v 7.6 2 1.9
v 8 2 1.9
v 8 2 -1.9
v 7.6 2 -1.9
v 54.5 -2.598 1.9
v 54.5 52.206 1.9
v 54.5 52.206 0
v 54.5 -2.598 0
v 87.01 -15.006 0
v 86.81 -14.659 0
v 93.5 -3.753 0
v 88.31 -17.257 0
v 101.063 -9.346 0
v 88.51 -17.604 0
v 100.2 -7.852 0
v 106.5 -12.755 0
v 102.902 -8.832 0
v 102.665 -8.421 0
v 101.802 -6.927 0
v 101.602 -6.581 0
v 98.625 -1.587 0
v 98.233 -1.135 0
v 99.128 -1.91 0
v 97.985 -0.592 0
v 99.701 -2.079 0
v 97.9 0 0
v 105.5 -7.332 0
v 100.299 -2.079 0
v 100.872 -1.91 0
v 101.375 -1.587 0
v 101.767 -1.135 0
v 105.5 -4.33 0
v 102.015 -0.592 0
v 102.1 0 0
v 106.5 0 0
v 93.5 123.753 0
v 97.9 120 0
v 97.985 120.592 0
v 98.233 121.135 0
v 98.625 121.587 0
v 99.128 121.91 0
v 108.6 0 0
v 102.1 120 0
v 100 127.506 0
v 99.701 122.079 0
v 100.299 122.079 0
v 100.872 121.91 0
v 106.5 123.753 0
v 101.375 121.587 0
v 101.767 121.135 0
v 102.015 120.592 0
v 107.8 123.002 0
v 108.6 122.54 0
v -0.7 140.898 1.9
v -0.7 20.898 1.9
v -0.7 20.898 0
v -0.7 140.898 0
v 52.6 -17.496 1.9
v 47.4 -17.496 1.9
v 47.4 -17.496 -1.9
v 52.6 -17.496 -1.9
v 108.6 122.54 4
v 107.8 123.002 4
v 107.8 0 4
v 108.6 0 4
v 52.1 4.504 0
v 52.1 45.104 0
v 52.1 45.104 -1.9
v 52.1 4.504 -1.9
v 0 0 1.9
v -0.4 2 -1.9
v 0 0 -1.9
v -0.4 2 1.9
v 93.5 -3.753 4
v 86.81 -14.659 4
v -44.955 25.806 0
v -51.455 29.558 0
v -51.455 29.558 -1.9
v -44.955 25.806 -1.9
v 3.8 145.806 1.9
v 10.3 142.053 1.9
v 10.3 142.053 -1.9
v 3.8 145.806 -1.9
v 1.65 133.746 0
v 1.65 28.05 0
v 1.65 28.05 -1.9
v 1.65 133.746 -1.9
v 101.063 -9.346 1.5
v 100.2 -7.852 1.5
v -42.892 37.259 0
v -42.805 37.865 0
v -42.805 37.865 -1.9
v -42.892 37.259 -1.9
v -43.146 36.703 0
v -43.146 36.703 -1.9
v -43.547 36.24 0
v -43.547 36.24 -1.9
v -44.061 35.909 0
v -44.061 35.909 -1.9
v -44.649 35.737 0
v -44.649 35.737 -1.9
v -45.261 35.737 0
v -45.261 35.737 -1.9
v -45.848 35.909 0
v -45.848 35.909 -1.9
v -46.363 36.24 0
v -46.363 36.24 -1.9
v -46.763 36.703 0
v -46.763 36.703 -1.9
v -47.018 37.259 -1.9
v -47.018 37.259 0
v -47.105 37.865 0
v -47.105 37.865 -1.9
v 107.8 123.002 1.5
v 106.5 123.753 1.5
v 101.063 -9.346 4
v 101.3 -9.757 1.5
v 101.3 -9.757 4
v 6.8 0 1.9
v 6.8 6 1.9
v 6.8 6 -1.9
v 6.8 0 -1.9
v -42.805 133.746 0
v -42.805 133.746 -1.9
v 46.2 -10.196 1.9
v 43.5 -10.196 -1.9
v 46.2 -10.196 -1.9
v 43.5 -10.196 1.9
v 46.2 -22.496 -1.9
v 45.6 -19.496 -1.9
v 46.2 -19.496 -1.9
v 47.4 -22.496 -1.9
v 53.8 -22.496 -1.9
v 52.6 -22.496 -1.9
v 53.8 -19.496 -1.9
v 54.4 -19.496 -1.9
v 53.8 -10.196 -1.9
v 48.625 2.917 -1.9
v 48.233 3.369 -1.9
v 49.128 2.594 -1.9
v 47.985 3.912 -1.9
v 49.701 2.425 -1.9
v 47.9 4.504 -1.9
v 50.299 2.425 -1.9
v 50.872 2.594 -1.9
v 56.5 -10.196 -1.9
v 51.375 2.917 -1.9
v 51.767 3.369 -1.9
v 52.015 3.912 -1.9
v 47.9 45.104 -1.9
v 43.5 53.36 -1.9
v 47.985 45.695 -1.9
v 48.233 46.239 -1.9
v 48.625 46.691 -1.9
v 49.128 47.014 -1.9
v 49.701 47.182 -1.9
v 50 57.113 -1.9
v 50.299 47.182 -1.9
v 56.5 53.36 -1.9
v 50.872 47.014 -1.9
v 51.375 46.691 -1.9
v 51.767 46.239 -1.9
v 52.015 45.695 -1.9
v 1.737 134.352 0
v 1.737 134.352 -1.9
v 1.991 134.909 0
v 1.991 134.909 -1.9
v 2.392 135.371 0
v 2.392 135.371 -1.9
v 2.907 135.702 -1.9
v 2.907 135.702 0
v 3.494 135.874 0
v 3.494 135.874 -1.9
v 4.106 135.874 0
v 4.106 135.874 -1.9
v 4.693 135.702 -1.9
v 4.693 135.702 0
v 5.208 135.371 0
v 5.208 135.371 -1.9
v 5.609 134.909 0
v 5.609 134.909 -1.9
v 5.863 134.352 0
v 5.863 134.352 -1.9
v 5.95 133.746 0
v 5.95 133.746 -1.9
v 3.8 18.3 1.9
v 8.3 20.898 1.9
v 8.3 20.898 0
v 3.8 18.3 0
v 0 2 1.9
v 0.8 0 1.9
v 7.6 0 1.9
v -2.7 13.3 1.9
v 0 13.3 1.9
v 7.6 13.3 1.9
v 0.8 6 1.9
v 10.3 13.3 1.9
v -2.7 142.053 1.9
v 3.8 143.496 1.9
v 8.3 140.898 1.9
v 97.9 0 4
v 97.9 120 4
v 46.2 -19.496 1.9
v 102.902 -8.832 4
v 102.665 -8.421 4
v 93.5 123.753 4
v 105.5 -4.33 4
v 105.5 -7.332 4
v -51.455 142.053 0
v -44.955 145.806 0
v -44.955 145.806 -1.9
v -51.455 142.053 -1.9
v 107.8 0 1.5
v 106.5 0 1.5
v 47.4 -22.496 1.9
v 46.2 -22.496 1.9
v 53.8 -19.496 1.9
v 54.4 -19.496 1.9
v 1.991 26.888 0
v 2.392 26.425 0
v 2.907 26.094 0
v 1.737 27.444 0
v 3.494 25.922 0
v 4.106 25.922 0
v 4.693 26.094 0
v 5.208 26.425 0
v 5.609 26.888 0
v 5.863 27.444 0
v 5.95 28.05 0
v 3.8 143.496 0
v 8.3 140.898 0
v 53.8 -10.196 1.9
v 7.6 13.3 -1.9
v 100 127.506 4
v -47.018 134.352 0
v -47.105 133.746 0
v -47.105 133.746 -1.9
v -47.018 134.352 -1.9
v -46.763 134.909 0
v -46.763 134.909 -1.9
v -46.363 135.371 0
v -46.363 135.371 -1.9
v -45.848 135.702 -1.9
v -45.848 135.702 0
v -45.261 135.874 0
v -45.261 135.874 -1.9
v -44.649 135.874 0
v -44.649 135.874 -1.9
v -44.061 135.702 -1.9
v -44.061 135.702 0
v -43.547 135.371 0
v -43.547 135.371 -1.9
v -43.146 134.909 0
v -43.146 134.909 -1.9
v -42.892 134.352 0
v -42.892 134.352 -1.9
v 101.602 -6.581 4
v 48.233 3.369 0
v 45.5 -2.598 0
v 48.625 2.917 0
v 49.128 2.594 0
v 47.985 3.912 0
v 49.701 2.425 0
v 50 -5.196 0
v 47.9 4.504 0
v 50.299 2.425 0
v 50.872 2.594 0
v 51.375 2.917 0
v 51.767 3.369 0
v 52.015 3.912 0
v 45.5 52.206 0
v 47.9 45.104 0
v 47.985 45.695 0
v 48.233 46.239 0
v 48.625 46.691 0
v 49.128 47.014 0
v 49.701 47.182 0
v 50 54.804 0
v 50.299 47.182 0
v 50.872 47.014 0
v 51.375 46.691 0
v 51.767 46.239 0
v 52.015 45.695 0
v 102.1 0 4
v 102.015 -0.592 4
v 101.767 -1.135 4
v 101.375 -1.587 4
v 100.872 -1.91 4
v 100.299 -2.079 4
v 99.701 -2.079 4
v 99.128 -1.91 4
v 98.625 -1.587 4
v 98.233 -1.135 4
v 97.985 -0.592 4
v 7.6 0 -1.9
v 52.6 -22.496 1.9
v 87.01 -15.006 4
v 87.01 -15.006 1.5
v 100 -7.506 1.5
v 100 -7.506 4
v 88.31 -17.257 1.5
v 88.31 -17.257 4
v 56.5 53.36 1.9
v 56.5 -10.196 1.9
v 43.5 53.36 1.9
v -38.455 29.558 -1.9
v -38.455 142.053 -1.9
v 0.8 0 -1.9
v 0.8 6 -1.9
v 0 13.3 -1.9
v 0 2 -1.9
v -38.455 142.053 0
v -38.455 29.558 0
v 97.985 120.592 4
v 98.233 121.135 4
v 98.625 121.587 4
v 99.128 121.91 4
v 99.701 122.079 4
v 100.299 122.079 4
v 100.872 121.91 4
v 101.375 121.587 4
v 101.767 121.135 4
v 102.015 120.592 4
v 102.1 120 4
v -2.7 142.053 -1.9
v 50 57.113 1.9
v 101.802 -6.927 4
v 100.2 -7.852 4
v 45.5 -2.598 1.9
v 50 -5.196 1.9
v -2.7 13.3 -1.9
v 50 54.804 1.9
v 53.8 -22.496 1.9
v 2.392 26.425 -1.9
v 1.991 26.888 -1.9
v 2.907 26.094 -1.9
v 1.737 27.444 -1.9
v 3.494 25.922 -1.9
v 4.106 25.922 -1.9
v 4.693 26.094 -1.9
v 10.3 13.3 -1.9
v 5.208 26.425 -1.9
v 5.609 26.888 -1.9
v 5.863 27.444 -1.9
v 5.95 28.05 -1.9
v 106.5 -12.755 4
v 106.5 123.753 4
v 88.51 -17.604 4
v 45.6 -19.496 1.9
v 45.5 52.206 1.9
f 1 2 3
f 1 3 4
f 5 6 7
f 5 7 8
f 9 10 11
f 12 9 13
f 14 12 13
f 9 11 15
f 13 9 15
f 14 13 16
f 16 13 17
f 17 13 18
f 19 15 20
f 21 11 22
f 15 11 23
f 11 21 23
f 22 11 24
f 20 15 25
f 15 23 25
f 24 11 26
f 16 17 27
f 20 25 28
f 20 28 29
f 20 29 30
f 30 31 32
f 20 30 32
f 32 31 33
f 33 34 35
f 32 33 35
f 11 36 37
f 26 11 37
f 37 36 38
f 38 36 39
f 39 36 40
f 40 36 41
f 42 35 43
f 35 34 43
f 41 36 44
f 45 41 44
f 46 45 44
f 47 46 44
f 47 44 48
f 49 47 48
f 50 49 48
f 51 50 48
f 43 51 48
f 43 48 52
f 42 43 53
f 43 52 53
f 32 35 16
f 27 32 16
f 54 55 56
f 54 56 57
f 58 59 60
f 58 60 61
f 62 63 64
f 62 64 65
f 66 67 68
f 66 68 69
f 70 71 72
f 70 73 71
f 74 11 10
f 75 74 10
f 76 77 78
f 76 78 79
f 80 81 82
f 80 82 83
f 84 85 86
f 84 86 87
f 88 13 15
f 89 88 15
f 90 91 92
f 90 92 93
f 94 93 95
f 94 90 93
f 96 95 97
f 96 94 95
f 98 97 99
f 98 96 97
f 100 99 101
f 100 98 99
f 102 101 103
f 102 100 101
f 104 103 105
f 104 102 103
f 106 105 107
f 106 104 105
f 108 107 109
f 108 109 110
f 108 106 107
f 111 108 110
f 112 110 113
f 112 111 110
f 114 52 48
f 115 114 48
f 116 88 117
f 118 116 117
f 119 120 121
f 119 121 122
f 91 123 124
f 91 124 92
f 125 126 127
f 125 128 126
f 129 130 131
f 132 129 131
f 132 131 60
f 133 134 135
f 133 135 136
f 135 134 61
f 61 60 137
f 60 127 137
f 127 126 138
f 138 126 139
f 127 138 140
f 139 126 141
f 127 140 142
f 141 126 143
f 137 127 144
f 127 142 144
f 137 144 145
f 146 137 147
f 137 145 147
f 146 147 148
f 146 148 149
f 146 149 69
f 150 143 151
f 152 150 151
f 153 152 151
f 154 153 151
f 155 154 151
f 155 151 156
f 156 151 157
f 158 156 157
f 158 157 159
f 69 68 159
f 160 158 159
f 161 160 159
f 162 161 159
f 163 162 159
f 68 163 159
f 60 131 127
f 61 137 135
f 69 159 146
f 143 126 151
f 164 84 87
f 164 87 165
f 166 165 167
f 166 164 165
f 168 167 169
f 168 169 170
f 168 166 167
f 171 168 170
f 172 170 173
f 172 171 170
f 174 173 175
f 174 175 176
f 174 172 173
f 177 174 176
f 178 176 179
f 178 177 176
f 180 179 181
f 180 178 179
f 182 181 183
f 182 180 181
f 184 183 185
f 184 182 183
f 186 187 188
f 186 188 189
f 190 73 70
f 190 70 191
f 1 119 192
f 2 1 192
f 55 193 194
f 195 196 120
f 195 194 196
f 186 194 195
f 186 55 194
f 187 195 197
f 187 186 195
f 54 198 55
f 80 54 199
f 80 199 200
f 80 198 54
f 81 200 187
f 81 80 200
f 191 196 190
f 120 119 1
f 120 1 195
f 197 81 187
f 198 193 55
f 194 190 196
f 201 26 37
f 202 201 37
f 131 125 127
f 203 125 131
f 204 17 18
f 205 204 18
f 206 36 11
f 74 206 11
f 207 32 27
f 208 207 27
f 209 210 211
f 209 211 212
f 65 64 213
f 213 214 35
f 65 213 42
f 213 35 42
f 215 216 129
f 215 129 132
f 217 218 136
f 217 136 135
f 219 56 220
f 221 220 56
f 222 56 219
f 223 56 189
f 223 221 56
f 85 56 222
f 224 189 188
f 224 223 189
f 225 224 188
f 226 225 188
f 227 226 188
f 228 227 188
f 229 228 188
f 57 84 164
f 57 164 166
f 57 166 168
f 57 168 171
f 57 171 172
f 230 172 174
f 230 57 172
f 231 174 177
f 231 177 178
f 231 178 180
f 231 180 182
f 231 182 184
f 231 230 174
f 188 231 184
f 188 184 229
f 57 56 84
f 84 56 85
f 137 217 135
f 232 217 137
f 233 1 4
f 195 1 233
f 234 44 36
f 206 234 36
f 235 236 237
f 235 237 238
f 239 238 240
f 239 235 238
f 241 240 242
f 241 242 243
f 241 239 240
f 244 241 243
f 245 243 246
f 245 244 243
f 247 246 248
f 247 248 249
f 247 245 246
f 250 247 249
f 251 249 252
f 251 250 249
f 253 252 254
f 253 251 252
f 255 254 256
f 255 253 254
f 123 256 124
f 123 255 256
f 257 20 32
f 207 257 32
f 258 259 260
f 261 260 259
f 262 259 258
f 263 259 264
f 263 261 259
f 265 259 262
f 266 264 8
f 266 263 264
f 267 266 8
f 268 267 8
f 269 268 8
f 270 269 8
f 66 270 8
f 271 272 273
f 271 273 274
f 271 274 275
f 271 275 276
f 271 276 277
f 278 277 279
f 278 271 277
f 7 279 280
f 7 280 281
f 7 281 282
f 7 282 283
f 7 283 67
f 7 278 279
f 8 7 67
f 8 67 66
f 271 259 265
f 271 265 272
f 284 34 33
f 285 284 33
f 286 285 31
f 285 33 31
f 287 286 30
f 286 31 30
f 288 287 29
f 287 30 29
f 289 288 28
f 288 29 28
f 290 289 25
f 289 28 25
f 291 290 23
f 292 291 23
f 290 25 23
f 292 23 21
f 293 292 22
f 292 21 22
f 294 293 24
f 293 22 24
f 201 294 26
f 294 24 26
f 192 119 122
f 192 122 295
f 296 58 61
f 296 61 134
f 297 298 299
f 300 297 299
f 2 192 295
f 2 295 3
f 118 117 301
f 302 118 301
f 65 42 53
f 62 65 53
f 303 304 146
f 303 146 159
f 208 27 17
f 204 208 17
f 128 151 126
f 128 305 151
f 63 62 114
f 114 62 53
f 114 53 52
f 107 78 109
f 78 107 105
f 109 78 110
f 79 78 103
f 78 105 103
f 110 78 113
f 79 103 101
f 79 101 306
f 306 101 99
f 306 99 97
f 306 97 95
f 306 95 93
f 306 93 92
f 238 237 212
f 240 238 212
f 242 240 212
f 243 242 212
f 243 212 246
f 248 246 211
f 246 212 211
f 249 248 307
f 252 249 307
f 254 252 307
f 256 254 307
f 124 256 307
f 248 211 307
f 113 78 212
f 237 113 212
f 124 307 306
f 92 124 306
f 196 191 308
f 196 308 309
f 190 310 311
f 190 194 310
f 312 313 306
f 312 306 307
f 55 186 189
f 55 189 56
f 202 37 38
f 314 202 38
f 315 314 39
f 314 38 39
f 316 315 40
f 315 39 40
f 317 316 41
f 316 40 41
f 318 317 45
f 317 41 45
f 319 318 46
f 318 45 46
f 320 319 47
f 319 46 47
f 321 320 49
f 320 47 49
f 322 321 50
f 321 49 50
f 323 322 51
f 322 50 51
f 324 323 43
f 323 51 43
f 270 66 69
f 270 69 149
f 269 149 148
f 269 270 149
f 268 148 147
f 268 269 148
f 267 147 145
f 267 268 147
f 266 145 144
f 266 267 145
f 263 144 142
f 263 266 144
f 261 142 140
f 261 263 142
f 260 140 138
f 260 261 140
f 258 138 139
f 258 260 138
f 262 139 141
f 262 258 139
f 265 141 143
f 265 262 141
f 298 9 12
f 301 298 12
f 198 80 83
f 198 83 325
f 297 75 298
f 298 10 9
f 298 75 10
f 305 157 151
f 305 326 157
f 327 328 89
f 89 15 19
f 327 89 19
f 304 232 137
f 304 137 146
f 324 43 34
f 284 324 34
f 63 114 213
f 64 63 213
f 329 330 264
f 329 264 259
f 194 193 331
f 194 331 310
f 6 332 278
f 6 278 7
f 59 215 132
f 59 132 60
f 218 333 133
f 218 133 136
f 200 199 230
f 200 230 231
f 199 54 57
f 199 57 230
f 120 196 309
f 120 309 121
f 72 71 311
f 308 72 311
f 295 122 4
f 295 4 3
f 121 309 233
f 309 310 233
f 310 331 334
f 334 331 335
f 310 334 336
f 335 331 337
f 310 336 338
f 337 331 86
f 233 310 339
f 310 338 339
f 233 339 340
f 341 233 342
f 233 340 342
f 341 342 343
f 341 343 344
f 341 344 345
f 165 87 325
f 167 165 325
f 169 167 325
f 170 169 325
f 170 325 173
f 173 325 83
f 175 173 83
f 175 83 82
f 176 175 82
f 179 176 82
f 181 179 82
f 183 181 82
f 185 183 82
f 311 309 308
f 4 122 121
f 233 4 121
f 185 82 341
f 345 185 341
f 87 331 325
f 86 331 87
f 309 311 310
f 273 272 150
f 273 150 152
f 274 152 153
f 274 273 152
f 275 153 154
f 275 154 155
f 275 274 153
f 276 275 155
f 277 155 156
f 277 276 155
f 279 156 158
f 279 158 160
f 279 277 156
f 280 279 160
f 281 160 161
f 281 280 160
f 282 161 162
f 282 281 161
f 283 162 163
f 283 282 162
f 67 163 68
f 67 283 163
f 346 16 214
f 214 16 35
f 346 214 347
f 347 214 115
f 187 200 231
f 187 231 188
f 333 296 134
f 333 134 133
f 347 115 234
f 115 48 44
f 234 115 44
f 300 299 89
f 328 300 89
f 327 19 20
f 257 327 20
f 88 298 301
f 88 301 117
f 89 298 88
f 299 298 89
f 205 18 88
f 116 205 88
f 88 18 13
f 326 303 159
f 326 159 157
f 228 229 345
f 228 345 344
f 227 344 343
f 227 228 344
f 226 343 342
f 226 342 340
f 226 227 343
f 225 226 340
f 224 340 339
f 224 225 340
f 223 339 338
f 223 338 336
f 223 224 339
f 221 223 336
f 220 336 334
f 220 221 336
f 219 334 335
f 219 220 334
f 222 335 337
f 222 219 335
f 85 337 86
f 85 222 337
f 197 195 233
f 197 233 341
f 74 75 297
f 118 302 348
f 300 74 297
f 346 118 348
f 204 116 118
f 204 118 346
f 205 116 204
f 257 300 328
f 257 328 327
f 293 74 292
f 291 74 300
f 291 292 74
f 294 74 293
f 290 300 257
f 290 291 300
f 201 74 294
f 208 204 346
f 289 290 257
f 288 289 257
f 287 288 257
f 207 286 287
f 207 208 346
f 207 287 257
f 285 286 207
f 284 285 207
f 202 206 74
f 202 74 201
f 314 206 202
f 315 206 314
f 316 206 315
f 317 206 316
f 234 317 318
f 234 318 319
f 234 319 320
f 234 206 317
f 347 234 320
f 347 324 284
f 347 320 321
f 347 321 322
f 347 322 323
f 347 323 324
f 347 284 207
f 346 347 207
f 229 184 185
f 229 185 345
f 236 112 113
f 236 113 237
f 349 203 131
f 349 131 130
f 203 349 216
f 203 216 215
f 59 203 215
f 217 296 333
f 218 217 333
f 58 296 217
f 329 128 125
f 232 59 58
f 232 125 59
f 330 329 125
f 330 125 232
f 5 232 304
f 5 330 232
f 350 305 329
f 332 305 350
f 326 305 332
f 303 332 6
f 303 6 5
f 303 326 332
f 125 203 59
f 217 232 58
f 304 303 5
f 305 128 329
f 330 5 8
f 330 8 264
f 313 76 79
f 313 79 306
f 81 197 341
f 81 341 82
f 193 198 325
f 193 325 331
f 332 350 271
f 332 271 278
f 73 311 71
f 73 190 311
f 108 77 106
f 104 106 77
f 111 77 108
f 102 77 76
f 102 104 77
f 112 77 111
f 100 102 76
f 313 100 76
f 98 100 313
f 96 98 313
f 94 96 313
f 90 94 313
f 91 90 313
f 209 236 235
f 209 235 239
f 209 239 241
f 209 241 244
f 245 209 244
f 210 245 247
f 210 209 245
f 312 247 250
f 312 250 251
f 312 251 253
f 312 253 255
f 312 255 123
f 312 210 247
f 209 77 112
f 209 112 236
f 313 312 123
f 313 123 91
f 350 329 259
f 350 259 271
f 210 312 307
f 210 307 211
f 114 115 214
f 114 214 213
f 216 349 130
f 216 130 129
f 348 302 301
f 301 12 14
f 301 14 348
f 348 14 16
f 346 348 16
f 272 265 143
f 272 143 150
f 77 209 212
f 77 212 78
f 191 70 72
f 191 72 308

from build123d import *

# Parameters (mm, degrees)
F1_DEPTH = 1.9
F2_DEPTH = 1.9
F3_DEPTH = 4
F4_DEPTH = 1.5


# Not quite as in the source:
# - a feature names something its author has since deleted; it is built from what else it names


with BuildPart() as f1:
    # F0 (on Top) → F1 (new body, symmetric)
    with BuildSketch(Plane.XY):
        Polygon((-0.4, 2), (0, 0), (0.8, 0), (0.8, 6), (3.8, 6), (6.8, 6), (6.8, 0), (7.6, 0), (8, 2), (7.6, 2), (7.6, 13.3), (0, 13.3), (0, 2), align=None)
        Polygon((-2.7, 13.3), (0, 13.3), (7.6, 13.3), (10.3, 13.3), (10.3, 17.3), (-2.7, 17.3), align=None)
        Polygon((-2.7, 26.0947383738), (-2.7, 17.3), (10.3, 17.3), (10.3, 46.0942286341), (10.3, 135.7019237886), (10.3, 142.0527767497), (3.8, 145.8055534995), (-2.7, 142.0527767497), (-2.7, 135.7019237886), align=None)
        Polygon((8.3, 135.7019237886), (8.3, 26.0942286341), (8.3, 20.8980762114), (3.8, 18.3), (-0.7, 20.8980762114), (-0.7, 46.0947383738), (-0.7, 135.7019237886), (-0.7, 140.8980762114), (3.8, 143.4961524227), (8.3, 140.8980762114), align=None, mode=Mode.SUBTRACT)
    extrude(amount=F1_DEPTH, both=True)

    # F0 (on Top) → F2 (join)
    with BuildSketch(Plane.XY):
        Polygon((8.3, 20.8980762114), (8.3, 26.0942286341), (8.3, 135.7019237886), (8.3, 140.8980762114), (3.8, 143.4961524227), (-0.7, 140.8980762114), (-0.7, 135.7019237886), (-0.7, 46.0947383738), (-0.7, 20.8980762114), (3.8, 18.3), align=None)
        with BuildLine():
            ThreePointArc((5.95, 28.05), (3.8, 25.9), (1.65, 28.05))
            Line((1.65, 28.05), (1.65, 133.7461524227))
            ThreePointArc((1.65, 133.7461524227), (3.8, 135.8961524227), (5.95, 133.7461524227))
            Line((5.95, 133.7461524227), (5.95, 28.05))
        make_face(mode=Mode.SUBTRACT)
    extrude(amount=-F2_DEPTH)


with BuildPart() as f1b:
    # F0 (on Top) → F1, piece 2 (new body, symmetric)
    with BuildSketch(Plane.XY):
        Polygon((43.5, 24.8038475773), (43.5, -10.1961524227), (46.2, -10.1961524227), (46.2, -19.4961524227), (45.6, -19.4961524227), (46.2, -22.4961524227), (47.4, -22.4961524227), (47.4, -17.4961524227), (52.6, -17.4961524227), (52.6, -22.4961524227), (53.8, -22.4961524227), (54.4, -19.4961524227), (53.8, -19.4961524227), (53.8, -10.1961524227), (55.7, -10.1961524227), (56.5, -10.1961524227), (56.5, 24.8038475773), (56.5, 53.3604719043), (50, 57.1132486541), (43.5, 53.3604719043), align=None)
        Polygon((50, -5.1961524227), (45.5, -2.5980762114), (45.5, 2.5980762114), (45.5, 24.8038475773), (45.5, 47.0096189432), (45.5, 52.2057713659), (50, 54.8038475773), (54.5, 52.2057713659), (54.5, 47.0096189432), (54.5, 24.8038475773), (54.5, 2.5980762114), (54.5, -2.5980762114), align=None, mode=Mode.SUBTRACT)
    extrude(amount=F1_DEPTH, both=True)

    # F0 (on Top) → F2, piece 3 (join)
    with BuildSketch(Plane.XY):
        Polygon((45.5, 2.5980762114), (45.5, -2.5980762114), (50, -5.1961524227), (54.5, -2.5980762114), (54.5, 2.5980762114), (54.5, 24.8038475773), (54.5, 47.0096189432), (54.5, 52.2057713659), (50, 54.8038475773), (45.5, 52.2057713659), (45.5, 47.0096189432), (45.5, 24.8038475773), align=None)
        with BuildLine():
            ThreePointArc((52.1, 4.5038475773), (50, 2.4038475773), (47.9, 4.5038475773))
            Line((47.9, 4.5038475773), (47.9, 24.8038475773))
            Line((47.9, 24.8038475773), (47.9, 45.1038475773))
            ThreePointArc((47.9, 45.1038475773), (50, 47.2038475773), (52.1, 45.1038475773))
            Line((52.1, 45.1038475773), (52.1, 24.8038475773))
            Line((52.1, 24.8038475773), (52.1, 4.5038475773))
        make_face(mode=Mode.SUBTRACT)
    extrude(amount=-F2_DEPTH)


with BuildPart() as f2:
    # F0 (on Top) → F2, piece 2 (new body)
    with BuildSketch(Plane.XY):
        Polygon((-38.4546260238, 35.9091832103), (-38.4546260238, 85.8055534995), (-38.4546260238, 135.7019237886), (-38.4546260238, 142.0527767497), (-44.9546260238, 145.8055534995), (-51.4546260238, 142.0527767497), (-51.4546260238, 135.7019237886), (-51.4546260238, 85.8055534995), (-51.4546260238, 35.9091832103), (-51.4546260238, 29.5583302492), (-44.9546260238, 25.8055534995), (-38.4546260238, 29.5583302492), align=None)
        Polygon((-44.9546260238, 143.4961524227), (-40.4546260238, 140.8980762114), (-40.4546260238, 135.7019237886), (-40.4546260238, 85.8055534995), (-40.4546260238, 35.9091832103), (-40.4546260238, 30.7130307876), (-44.9546260238, 28.1149545762), (-49.4546260238, 30.7130307876), (-49.4546260238, 35.9091832103), (-49.4546260238, 85.8055534995), (-49.4546260238, 135.7019237886), (-49.4546260238, 140.8980762114), align=None, mode=Mode.SUBTRACT)
        Polygon((-40.4546260238, 135.7019237886), (-40.4546260238, 140.8980762114), (-44.9546260238, 143.4961524227), (-49.4546260238, 140.8980762114), (-49.4546260238, 135.7019237886), (-49.4546260238, 85.8055534995), (-49.4546260238, 35.9091832103), (-49.4546260238, 30.7130307876), (-44.9546260238, 28.1149545762), (-40.4546260238, 30.7130307876), (-40.4546260238, 35.9091832103), (-40.4546260238, 85.8055534995), align=None)
        with BuildLine():
            ThreePointArc((-47.1046260238, 133.7461524227), (-44.9546260238, 135.8961524227), (-42.8046260238, 133.7461524227))
            Line((-42.8046260238, 133.7461524227), (-42.8046260238, 85.8055534995))
            Line((-42.8046260238, 85.8055534995), (-42.8046260238, 37.8649545762))
            ThreePointArc((-42.8046260238, 37.8649545762), (-44.9546260238, 35.7149545762), (-47.1046260238, 37.8649545762))
            Line((-47.1046260238, 37.8649545762), (-47.1046260238, 85.8055534995))
            Line((-47.1046260238, 85.8055534995), (-47.1046260238, 133.7461524227))
        make_face(mode=Mode.SUBTRACT)
    extrude(amount=-F2_DEPTH)


with BuildPart() as f3:
    # F0 (on Top) → F3 (new body)
    with BuildSketch(Plane.XY):
        Polygon((93.5, 3.7527767497), (93.5, -3.7527767497), (100, -7.5055534995), (100.2, -7.851963661), (101.8019237886, -6.9270925304), (101.6019237886, -6.5806823689), (105.5, -4.3301270189), (105.5, -4.7920072343), (105.5, -6.7844546003), (105.5, -7.3323484187), (102.9019237886, -8.8323484187), (102.664678806, -8.4214280549), (101.0627550173, -9.3462991855), (101.3, -9.7572195493), (88.3096189432, -17.2572195493), (88.5096189432, -17.6036297108), (106.5, -12.7549981495), (106.5, -6.7549981495), (106.5, -6.2071043311), (106.5, -4.2146569651), (106.5, 0), (106.5, 3.7527767497), (106.5, 60), (106.5, 116.2472232503), (106.5, 123.7527767497), (100, 127.5055534995), (93.5, 123.7527767497), (93.5, 116.2472232503), (93.5, 60), align=None)
        with BuildLine():
            ThreePointArc((102.1, 0), (100, -2.1), (97.9, 0))
            Line((97.9, 0), (97.9, 60))
            Line((97.9, 60), (97.9, 120))
            ThreePointArc((97.9, 120), (100, 122.1), (102.1, 120))
            Line((102.1, 120), (102.1, 60))
            Line((102.1, 60), (102.1, 0))
        make_face(mode=Mode.SUBTRACT)
        Polygon((100, -7.5055534995), (93.5, -3.7527767497), (86.8096189432, -14.659143338), (87.0096189432, -15.0055534995), align=None)
    extrude(amount=F3_DEPTH)



with BuildPart() as f3b:
    # F0 (on Top) → F3, piece 2 (new body)
    with BuildSketch(Plane.XY):
        Polygon((108.6, 122.5403411844), (107.8, 123.0022213998), (107.8, 0), (108.6, 0), align=None)
    extrude(amount=F3_DEPTH)


with BuildPart() as f3_1:
    add(f3.part)

    add(f3b.part)  # F4 merges F3b
    # F0 (on Top) → F4 (join)
    with BuildSketch(Plane.XY):
        Polygon((107.8, 123.0022213998), (106.5, 123.7527767497), (106.5, 116.2472232503), (106.5, 60), (106.5, 3.7527767497), (106.5, 0), (107.8, 0), align=None)
        Polygon((100.2, -7.851963661), (100, -7.5055534995), (87.0096189432, -15.0055534995), (88.3096189432, -17.2572195493), (101.3, -9.7572195493), (101.0627550173, -9.3462991855), align=None)
    extrude(amount=F4_DEPTH)


solid = Compound([f1.part, f1b.part, f2.part, f3_1.part])
